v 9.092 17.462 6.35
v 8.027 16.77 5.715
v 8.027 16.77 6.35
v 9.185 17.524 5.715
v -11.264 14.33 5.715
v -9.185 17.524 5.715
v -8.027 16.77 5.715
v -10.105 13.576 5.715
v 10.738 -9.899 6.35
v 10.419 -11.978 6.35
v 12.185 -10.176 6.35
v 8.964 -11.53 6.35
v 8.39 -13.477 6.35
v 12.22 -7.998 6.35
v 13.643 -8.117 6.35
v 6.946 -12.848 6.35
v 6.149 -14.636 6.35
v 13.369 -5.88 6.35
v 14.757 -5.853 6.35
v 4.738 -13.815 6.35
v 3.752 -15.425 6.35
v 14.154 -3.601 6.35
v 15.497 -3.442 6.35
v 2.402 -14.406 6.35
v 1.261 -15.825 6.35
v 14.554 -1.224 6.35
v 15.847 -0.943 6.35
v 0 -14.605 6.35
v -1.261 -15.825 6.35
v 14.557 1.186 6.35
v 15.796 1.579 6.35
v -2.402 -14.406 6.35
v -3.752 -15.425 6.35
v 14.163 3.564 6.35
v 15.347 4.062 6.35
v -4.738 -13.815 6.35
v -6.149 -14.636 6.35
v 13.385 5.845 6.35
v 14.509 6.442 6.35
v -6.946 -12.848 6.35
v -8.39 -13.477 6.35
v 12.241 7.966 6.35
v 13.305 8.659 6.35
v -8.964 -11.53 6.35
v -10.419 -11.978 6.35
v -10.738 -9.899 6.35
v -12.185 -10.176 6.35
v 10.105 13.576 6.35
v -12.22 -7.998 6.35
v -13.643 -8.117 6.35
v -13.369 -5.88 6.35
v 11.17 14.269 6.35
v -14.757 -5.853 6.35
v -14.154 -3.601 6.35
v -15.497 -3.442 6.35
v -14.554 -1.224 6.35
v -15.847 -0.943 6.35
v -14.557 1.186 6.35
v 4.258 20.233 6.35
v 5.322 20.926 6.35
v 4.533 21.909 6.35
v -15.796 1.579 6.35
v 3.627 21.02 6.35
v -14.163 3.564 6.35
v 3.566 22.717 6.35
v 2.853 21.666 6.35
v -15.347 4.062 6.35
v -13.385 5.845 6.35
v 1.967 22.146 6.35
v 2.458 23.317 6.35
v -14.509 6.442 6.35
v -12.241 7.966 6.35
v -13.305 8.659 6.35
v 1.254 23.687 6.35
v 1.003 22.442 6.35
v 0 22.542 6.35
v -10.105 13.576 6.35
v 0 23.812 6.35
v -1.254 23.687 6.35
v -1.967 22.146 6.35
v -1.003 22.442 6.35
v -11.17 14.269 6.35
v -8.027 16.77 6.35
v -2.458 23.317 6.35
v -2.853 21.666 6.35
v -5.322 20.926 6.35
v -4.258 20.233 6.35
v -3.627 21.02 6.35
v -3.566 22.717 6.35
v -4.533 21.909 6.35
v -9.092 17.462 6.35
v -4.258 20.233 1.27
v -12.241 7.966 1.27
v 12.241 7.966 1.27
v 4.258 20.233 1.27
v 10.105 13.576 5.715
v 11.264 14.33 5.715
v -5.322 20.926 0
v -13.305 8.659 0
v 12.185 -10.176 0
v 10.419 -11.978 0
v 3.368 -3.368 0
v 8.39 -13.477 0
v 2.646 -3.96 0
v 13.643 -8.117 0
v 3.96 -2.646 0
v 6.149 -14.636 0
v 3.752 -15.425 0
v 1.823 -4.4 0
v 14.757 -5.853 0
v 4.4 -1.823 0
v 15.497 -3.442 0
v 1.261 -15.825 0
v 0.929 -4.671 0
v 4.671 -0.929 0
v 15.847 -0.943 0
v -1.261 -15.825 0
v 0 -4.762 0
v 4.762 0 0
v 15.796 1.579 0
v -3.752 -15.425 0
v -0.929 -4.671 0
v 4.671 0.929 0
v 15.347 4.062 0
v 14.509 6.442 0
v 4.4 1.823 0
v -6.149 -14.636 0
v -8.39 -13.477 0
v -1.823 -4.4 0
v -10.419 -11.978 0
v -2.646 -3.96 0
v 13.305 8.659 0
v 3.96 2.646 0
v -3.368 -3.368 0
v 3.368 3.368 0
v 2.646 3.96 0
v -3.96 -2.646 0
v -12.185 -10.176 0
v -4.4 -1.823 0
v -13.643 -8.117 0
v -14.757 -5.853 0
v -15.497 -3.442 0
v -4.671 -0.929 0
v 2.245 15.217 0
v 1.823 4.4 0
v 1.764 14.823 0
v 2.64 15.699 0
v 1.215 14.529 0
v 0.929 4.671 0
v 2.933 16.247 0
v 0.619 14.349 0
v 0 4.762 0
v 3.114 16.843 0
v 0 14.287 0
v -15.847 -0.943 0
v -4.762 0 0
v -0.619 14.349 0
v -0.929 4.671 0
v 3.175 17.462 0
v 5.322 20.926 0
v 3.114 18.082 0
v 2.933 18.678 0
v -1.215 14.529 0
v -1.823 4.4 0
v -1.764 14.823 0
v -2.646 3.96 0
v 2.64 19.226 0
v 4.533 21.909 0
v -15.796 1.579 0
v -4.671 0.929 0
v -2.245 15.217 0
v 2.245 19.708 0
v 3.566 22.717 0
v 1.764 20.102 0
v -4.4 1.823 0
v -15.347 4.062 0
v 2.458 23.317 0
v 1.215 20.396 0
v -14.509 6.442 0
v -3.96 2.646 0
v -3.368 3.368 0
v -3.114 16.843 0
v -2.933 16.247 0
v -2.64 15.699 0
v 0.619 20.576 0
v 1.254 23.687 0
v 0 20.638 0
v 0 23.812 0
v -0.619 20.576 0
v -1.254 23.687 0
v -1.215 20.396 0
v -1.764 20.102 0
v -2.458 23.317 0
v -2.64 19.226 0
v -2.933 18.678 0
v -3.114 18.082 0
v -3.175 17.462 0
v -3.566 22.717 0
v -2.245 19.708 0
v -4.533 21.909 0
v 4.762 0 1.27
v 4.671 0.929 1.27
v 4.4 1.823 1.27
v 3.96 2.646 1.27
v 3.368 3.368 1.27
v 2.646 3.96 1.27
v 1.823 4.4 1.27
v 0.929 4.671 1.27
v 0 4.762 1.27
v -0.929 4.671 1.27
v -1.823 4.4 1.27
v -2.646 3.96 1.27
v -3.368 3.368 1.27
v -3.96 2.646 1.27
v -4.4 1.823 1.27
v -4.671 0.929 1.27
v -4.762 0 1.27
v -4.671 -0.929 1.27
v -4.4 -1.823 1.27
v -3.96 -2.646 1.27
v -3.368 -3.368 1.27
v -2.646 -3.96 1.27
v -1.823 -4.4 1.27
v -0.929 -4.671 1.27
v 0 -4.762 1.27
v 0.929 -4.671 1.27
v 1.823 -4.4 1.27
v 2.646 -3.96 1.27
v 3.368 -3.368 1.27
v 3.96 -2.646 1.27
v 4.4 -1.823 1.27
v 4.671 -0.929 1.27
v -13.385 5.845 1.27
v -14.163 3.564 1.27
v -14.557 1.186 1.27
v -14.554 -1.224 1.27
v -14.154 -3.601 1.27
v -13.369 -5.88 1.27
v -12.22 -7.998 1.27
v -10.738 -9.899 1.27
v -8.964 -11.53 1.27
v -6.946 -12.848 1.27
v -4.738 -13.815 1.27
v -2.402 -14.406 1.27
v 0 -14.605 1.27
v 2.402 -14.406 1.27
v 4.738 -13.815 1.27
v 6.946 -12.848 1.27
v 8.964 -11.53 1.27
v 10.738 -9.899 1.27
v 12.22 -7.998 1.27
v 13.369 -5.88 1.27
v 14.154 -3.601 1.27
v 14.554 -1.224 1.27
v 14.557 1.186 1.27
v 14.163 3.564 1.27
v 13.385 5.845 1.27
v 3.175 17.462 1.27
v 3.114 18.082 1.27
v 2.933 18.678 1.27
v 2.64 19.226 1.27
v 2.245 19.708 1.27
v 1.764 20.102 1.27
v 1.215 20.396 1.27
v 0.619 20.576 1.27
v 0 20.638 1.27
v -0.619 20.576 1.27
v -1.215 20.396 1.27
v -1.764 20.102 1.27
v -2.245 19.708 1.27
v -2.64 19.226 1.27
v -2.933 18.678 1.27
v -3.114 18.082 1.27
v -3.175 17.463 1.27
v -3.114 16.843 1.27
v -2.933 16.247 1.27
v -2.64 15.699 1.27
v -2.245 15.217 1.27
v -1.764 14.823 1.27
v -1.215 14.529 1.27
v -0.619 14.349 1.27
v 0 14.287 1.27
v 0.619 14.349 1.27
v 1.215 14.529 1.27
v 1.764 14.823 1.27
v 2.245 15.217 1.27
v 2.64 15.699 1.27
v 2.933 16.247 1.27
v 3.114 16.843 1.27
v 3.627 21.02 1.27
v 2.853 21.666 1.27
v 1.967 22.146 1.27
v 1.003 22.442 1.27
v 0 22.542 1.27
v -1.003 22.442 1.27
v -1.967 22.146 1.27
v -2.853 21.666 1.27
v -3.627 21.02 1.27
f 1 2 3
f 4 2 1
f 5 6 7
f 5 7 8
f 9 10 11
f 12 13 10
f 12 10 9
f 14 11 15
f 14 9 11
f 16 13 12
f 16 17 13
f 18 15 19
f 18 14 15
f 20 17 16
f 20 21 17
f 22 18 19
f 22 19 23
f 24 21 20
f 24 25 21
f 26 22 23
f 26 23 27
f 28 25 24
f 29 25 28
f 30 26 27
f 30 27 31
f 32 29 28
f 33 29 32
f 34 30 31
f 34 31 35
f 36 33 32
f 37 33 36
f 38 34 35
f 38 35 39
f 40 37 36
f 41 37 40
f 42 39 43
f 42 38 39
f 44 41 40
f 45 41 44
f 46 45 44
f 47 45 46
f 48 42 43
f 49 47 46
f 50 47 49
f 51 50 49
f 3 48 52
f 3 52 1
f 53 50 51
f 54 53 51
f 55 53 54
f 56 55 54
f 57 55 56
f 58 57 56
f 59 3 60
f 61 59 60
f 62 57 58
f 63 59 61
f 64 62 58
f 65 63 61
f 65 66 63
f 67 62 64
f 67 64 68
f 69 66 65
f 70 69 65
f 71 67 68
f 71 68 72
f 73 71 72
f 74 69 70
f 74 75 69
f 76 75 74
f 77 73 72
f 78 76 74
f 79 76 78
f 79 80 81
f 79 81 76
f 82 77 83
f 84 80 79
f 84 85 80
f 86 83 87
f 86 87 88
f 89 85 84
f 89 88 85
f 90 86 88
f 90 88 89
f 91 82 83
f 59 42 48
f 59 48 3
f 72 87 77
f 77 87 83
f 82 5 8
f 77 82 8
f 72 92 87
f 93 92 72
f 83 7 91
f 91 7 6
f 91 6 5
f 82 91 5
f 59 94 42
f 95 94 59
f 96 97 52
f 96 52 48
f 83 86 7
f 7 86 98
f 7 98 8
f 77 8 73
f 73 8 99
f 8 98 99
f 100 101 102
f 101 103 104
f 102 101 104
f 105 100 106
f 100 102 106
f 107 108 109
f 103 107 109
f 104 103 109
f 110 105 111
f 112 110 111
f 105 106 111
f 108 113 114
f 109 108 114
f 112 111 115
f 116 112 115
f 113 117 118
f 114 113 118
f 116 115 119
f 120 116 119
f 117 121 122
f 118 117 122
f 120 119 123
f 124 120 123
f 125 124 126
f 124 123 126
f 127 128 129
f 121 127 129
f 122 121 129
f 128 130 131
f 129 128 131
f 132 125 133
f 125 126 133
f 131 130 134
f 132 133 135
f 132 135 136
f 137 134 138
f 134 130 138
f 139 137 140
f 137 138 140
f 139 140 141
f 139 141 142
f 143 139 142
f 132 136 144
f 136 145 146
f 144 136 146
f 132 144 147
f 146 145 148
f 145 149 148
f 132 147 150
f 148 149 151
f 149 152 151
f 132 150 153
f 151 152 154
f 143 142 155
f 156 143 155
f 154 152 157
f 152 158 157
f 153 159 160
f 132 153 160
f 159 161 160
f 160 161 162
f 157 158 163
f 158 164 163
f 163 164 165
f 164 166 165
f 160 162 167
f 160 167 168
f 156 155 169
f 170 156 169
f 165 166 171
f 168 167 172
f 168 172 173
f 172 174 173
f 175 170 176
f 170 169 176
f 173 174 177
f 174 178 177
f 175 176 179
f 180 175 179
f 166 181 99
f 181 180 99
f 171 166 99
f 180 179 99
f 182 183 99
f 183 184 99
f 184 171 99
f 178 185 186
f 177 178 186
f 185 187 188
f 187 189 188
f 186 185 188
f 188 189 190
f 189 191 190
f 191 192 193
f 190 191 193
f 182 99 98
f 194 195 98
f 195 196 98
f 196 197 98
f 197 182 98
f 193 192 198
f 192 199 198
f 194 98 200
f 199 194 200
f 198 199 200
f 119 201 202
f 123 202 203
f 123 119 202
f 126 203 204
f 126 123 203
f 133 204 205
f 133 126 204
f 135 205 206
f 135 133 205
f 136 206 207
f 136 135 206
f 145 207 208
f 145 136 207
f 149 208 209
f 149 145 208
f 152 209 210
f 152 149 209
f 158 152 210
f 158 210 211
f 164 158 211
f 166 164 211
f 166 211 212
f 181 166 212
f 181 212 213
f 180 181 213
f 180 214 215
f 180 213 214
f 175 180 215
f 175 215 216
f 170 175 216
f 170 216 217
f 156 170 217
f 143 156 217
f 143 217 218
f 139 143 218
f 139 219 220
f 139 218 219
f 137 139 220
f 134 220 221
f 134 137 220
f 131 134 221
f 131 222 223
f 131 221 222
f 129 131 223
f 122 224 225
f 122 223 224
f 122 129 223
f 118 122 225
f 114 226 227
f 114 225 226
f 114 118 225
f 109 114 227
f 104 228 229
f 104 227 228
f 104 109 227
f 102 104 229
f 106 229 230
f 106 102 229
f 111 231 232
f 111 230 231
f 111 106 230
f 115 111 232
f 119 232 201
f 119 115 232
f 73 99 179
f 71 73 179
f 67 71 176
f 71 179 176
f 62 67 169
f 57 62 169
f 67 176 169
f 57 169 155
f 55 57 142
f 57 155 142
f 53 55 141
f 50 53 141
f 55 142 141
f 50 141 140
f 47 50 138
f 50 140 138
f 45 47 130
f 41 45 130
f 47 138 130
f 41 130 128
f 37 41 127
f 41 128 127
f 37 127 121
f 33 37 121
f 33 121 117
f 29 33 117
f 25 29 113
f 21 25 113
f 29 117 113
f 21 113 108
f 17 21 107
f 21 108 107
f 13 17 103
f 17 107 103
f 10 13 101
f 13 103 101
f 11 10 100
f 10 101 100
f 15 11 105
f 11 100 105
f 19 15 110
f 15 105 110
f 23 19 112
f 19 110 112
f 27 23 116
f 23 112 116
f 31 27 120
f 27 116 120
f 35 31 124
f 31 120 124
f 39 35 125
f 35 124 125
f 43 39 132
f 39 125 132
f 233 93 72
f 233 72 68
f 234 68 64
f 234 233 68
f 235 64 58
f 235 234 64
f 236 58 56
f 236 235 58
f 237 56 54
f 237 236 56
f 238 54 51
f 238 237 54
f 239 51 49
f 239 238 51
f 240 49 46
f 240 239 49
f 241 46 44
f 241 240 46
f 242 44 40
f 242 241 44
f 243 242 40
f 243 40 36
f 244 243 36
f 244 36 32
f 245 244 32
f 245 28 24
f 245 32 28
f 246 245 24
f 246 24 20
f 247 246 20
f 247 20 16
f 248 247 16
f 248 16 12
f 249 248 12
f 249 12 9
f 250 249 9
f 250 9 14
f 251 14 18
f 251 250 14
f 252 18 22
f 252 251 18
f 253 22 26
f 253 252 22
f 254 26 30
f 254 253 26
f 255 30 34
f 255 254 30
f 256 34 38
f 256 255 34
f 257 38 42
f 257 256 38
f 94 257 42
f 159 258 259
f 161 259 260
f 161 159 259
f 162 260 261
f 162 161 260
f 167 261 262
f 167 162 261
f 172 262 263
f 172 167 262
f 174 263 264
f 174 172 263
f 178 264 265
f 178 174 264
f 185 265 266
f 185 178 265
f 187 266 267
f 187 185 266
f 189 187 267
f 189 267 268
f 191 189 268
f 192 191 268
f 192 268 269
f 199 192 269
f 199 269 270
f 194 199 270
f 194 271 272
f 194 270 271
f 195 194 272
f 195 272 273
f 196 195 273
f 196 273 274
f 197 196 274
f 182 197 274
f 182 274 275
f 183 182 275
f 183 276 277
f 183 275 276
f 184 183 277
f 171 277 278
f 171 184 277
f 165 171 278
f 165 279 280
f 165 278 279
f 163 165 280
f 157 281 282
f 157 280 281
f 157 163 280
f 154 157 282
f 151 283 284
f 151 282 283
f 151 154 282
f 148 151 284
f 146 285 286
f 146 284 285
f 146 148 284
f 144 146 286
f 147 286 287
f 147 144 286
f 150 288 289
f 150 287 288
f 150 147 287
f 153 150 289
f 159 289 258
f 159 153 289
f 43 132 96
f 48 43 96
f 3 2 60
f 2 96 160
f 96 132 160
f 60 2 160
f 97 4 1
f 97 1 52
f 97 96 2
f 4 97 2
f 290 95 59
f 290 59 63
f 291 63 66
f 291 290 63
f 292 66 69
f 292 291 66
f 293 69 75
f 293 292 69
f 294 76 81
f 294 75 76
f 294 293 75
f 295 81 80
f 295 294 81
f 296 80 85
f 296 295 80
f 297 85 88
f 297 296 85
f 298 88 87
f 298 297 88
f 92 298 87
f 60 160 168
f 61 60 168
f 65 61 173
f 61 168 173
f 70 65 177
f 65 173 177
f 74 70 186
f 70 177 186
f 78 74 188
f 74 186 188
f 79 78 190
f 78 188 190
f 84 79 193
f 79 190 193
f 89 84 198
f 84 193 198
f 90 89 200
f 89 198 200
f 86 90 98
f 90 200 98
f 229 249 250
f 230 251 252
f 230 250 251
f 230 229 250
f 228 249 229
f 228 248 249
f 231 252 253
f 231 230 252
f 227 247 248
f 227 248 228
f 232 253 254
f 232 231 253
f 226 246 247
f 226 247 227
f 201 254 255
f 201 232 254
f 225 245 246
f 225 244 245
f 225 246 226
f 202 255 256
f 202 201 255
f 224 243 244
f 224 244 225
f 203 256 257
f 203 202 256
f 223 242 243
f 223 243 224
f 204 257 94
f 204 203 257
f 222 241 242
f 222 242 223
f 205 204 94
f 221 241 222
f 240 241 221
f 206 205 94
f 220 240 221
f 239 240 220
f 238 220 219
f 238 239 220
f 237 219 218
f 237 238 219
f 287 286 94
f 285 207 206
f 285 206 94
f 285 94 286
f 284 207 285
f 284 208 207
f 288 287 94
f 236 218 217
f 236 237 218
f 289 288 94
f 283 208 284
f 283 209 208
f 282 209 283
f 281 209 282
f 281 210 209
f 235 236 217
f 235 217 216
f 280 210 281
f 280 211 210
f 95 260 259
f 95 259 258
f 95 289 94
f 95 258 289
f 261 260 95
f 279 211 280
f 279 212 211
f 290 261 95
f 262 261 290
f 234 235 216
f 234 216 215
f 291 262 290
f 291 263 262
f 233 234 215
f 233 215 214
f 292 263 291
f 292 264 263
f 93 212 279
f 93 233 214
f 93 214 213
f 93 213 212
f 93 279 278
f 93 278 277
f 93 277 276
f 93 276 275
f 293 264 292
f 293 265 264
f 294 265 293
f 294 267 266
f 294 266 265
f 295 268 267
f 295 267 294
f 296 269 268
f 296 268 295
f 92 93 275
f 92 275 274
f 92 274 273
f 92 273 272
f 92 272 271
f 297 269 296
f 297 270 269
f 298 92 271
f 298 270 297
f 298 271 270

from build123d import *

# Parameters (mm, degrees)
BOSS_EXTRUDE2_DEPTH = 6.35
SHELL3_T            = -1.27
SKETCH2_7_R         = 4.7625
SKETCH2_7_R_2       = 3.175
CUT_EXTRUDE2_DEPTH  = 30.315069184
BOSS_EXTRUDE3_DEPTH = 0.635
DRAFT2_ANGLE        = 10


with BuildPart() as part:
    # Sketch2 → Boss-Extrude2 (new body)
    with BuildSketch(Plane(origin=(0, 0, 0), x_dir=(0, 1, 0), z_dir=(0, 0, 1))):
        with BuildLine():
            Line((8.659090909, -13.305478933), (20.926136364, -5.322191573))
            ThreePointArc((20.926136364, -5.322191573), (23.8125, 0), (20.926136364, 5.322191573))
            Line((20.926136364, 5.322191573), (8.659090909, 13.305478933))
            ThreePointArc((8.659090909, 13.305478933), (-15.875, 0), (8.659090909, -13.305478933))
        make_face()
    extrude(amount=BOSS_EXTRUDE2_DEPTH)

    # Shell3
    shell3_openings = [part.faces().sort_by_distance(p)[0] for p in [
        (0, 2.303090429, 6.35),
    ]]
    offset(amount=SHELL3_T, openings=shell3_openings, kind=Kind.INTERSECTION)

    # Sketch2<7> → Cut-Extrude2 (cut, through all)
    with BuildSketch(Plane(origin=(0, 0, 0), x_dir=(0, 1, 0), z_dir=(0, 0, 1))):
        with Locations(Location((0, 0, 0), (0, 0, 270))):
            Circle(SKETCH2_7_R)
        with Locations(Location((17.4625, 0, 0), (0, 0, 270))):
            Circle(SKETCH2_7_R_2)
    extrude(amount=CUT_EXTRUDE2_DEPTH, mode=Mode.SUBTRACT)

    # Sketch6 → Boss-Extrude3 (add)
    with BuildSketch(Plane(origin=(0, 0, 5.715), x_dir=(0, -1, 0), z_dir=(0, 0, 1))):
        Polygon((-16.769772727, 8.027117173), (-17.4625, 9.091555487), (-14.269185056, 11.169737305), (-13.576457783, 10.105298991), align=None)
        Polygon((-14.269185056, -11.169737305), (-13.576457783, -10.105298991), (-16.769772727, -8.027117173), (-17.4625, -9.091555487), align=None)
    extrude(amount=BOSS_EXTRUDE3_DEPTH)

    # Draft2
    draft2_faces = [part.faces().sort_by_distance(p)[0] for p in [
        (10.130646396, 15.865842528, 6.0325),
        (-10.130646396, 15.865842528, 6.0325),
    ]]
    draft(draft2_faces, Plane(origin=(0, 17.4625, 6.35), x_dir=(1, 0, 0), z_dir=(0, 0, 1)), DRAFT2_ANGLE)


solid = part.part
